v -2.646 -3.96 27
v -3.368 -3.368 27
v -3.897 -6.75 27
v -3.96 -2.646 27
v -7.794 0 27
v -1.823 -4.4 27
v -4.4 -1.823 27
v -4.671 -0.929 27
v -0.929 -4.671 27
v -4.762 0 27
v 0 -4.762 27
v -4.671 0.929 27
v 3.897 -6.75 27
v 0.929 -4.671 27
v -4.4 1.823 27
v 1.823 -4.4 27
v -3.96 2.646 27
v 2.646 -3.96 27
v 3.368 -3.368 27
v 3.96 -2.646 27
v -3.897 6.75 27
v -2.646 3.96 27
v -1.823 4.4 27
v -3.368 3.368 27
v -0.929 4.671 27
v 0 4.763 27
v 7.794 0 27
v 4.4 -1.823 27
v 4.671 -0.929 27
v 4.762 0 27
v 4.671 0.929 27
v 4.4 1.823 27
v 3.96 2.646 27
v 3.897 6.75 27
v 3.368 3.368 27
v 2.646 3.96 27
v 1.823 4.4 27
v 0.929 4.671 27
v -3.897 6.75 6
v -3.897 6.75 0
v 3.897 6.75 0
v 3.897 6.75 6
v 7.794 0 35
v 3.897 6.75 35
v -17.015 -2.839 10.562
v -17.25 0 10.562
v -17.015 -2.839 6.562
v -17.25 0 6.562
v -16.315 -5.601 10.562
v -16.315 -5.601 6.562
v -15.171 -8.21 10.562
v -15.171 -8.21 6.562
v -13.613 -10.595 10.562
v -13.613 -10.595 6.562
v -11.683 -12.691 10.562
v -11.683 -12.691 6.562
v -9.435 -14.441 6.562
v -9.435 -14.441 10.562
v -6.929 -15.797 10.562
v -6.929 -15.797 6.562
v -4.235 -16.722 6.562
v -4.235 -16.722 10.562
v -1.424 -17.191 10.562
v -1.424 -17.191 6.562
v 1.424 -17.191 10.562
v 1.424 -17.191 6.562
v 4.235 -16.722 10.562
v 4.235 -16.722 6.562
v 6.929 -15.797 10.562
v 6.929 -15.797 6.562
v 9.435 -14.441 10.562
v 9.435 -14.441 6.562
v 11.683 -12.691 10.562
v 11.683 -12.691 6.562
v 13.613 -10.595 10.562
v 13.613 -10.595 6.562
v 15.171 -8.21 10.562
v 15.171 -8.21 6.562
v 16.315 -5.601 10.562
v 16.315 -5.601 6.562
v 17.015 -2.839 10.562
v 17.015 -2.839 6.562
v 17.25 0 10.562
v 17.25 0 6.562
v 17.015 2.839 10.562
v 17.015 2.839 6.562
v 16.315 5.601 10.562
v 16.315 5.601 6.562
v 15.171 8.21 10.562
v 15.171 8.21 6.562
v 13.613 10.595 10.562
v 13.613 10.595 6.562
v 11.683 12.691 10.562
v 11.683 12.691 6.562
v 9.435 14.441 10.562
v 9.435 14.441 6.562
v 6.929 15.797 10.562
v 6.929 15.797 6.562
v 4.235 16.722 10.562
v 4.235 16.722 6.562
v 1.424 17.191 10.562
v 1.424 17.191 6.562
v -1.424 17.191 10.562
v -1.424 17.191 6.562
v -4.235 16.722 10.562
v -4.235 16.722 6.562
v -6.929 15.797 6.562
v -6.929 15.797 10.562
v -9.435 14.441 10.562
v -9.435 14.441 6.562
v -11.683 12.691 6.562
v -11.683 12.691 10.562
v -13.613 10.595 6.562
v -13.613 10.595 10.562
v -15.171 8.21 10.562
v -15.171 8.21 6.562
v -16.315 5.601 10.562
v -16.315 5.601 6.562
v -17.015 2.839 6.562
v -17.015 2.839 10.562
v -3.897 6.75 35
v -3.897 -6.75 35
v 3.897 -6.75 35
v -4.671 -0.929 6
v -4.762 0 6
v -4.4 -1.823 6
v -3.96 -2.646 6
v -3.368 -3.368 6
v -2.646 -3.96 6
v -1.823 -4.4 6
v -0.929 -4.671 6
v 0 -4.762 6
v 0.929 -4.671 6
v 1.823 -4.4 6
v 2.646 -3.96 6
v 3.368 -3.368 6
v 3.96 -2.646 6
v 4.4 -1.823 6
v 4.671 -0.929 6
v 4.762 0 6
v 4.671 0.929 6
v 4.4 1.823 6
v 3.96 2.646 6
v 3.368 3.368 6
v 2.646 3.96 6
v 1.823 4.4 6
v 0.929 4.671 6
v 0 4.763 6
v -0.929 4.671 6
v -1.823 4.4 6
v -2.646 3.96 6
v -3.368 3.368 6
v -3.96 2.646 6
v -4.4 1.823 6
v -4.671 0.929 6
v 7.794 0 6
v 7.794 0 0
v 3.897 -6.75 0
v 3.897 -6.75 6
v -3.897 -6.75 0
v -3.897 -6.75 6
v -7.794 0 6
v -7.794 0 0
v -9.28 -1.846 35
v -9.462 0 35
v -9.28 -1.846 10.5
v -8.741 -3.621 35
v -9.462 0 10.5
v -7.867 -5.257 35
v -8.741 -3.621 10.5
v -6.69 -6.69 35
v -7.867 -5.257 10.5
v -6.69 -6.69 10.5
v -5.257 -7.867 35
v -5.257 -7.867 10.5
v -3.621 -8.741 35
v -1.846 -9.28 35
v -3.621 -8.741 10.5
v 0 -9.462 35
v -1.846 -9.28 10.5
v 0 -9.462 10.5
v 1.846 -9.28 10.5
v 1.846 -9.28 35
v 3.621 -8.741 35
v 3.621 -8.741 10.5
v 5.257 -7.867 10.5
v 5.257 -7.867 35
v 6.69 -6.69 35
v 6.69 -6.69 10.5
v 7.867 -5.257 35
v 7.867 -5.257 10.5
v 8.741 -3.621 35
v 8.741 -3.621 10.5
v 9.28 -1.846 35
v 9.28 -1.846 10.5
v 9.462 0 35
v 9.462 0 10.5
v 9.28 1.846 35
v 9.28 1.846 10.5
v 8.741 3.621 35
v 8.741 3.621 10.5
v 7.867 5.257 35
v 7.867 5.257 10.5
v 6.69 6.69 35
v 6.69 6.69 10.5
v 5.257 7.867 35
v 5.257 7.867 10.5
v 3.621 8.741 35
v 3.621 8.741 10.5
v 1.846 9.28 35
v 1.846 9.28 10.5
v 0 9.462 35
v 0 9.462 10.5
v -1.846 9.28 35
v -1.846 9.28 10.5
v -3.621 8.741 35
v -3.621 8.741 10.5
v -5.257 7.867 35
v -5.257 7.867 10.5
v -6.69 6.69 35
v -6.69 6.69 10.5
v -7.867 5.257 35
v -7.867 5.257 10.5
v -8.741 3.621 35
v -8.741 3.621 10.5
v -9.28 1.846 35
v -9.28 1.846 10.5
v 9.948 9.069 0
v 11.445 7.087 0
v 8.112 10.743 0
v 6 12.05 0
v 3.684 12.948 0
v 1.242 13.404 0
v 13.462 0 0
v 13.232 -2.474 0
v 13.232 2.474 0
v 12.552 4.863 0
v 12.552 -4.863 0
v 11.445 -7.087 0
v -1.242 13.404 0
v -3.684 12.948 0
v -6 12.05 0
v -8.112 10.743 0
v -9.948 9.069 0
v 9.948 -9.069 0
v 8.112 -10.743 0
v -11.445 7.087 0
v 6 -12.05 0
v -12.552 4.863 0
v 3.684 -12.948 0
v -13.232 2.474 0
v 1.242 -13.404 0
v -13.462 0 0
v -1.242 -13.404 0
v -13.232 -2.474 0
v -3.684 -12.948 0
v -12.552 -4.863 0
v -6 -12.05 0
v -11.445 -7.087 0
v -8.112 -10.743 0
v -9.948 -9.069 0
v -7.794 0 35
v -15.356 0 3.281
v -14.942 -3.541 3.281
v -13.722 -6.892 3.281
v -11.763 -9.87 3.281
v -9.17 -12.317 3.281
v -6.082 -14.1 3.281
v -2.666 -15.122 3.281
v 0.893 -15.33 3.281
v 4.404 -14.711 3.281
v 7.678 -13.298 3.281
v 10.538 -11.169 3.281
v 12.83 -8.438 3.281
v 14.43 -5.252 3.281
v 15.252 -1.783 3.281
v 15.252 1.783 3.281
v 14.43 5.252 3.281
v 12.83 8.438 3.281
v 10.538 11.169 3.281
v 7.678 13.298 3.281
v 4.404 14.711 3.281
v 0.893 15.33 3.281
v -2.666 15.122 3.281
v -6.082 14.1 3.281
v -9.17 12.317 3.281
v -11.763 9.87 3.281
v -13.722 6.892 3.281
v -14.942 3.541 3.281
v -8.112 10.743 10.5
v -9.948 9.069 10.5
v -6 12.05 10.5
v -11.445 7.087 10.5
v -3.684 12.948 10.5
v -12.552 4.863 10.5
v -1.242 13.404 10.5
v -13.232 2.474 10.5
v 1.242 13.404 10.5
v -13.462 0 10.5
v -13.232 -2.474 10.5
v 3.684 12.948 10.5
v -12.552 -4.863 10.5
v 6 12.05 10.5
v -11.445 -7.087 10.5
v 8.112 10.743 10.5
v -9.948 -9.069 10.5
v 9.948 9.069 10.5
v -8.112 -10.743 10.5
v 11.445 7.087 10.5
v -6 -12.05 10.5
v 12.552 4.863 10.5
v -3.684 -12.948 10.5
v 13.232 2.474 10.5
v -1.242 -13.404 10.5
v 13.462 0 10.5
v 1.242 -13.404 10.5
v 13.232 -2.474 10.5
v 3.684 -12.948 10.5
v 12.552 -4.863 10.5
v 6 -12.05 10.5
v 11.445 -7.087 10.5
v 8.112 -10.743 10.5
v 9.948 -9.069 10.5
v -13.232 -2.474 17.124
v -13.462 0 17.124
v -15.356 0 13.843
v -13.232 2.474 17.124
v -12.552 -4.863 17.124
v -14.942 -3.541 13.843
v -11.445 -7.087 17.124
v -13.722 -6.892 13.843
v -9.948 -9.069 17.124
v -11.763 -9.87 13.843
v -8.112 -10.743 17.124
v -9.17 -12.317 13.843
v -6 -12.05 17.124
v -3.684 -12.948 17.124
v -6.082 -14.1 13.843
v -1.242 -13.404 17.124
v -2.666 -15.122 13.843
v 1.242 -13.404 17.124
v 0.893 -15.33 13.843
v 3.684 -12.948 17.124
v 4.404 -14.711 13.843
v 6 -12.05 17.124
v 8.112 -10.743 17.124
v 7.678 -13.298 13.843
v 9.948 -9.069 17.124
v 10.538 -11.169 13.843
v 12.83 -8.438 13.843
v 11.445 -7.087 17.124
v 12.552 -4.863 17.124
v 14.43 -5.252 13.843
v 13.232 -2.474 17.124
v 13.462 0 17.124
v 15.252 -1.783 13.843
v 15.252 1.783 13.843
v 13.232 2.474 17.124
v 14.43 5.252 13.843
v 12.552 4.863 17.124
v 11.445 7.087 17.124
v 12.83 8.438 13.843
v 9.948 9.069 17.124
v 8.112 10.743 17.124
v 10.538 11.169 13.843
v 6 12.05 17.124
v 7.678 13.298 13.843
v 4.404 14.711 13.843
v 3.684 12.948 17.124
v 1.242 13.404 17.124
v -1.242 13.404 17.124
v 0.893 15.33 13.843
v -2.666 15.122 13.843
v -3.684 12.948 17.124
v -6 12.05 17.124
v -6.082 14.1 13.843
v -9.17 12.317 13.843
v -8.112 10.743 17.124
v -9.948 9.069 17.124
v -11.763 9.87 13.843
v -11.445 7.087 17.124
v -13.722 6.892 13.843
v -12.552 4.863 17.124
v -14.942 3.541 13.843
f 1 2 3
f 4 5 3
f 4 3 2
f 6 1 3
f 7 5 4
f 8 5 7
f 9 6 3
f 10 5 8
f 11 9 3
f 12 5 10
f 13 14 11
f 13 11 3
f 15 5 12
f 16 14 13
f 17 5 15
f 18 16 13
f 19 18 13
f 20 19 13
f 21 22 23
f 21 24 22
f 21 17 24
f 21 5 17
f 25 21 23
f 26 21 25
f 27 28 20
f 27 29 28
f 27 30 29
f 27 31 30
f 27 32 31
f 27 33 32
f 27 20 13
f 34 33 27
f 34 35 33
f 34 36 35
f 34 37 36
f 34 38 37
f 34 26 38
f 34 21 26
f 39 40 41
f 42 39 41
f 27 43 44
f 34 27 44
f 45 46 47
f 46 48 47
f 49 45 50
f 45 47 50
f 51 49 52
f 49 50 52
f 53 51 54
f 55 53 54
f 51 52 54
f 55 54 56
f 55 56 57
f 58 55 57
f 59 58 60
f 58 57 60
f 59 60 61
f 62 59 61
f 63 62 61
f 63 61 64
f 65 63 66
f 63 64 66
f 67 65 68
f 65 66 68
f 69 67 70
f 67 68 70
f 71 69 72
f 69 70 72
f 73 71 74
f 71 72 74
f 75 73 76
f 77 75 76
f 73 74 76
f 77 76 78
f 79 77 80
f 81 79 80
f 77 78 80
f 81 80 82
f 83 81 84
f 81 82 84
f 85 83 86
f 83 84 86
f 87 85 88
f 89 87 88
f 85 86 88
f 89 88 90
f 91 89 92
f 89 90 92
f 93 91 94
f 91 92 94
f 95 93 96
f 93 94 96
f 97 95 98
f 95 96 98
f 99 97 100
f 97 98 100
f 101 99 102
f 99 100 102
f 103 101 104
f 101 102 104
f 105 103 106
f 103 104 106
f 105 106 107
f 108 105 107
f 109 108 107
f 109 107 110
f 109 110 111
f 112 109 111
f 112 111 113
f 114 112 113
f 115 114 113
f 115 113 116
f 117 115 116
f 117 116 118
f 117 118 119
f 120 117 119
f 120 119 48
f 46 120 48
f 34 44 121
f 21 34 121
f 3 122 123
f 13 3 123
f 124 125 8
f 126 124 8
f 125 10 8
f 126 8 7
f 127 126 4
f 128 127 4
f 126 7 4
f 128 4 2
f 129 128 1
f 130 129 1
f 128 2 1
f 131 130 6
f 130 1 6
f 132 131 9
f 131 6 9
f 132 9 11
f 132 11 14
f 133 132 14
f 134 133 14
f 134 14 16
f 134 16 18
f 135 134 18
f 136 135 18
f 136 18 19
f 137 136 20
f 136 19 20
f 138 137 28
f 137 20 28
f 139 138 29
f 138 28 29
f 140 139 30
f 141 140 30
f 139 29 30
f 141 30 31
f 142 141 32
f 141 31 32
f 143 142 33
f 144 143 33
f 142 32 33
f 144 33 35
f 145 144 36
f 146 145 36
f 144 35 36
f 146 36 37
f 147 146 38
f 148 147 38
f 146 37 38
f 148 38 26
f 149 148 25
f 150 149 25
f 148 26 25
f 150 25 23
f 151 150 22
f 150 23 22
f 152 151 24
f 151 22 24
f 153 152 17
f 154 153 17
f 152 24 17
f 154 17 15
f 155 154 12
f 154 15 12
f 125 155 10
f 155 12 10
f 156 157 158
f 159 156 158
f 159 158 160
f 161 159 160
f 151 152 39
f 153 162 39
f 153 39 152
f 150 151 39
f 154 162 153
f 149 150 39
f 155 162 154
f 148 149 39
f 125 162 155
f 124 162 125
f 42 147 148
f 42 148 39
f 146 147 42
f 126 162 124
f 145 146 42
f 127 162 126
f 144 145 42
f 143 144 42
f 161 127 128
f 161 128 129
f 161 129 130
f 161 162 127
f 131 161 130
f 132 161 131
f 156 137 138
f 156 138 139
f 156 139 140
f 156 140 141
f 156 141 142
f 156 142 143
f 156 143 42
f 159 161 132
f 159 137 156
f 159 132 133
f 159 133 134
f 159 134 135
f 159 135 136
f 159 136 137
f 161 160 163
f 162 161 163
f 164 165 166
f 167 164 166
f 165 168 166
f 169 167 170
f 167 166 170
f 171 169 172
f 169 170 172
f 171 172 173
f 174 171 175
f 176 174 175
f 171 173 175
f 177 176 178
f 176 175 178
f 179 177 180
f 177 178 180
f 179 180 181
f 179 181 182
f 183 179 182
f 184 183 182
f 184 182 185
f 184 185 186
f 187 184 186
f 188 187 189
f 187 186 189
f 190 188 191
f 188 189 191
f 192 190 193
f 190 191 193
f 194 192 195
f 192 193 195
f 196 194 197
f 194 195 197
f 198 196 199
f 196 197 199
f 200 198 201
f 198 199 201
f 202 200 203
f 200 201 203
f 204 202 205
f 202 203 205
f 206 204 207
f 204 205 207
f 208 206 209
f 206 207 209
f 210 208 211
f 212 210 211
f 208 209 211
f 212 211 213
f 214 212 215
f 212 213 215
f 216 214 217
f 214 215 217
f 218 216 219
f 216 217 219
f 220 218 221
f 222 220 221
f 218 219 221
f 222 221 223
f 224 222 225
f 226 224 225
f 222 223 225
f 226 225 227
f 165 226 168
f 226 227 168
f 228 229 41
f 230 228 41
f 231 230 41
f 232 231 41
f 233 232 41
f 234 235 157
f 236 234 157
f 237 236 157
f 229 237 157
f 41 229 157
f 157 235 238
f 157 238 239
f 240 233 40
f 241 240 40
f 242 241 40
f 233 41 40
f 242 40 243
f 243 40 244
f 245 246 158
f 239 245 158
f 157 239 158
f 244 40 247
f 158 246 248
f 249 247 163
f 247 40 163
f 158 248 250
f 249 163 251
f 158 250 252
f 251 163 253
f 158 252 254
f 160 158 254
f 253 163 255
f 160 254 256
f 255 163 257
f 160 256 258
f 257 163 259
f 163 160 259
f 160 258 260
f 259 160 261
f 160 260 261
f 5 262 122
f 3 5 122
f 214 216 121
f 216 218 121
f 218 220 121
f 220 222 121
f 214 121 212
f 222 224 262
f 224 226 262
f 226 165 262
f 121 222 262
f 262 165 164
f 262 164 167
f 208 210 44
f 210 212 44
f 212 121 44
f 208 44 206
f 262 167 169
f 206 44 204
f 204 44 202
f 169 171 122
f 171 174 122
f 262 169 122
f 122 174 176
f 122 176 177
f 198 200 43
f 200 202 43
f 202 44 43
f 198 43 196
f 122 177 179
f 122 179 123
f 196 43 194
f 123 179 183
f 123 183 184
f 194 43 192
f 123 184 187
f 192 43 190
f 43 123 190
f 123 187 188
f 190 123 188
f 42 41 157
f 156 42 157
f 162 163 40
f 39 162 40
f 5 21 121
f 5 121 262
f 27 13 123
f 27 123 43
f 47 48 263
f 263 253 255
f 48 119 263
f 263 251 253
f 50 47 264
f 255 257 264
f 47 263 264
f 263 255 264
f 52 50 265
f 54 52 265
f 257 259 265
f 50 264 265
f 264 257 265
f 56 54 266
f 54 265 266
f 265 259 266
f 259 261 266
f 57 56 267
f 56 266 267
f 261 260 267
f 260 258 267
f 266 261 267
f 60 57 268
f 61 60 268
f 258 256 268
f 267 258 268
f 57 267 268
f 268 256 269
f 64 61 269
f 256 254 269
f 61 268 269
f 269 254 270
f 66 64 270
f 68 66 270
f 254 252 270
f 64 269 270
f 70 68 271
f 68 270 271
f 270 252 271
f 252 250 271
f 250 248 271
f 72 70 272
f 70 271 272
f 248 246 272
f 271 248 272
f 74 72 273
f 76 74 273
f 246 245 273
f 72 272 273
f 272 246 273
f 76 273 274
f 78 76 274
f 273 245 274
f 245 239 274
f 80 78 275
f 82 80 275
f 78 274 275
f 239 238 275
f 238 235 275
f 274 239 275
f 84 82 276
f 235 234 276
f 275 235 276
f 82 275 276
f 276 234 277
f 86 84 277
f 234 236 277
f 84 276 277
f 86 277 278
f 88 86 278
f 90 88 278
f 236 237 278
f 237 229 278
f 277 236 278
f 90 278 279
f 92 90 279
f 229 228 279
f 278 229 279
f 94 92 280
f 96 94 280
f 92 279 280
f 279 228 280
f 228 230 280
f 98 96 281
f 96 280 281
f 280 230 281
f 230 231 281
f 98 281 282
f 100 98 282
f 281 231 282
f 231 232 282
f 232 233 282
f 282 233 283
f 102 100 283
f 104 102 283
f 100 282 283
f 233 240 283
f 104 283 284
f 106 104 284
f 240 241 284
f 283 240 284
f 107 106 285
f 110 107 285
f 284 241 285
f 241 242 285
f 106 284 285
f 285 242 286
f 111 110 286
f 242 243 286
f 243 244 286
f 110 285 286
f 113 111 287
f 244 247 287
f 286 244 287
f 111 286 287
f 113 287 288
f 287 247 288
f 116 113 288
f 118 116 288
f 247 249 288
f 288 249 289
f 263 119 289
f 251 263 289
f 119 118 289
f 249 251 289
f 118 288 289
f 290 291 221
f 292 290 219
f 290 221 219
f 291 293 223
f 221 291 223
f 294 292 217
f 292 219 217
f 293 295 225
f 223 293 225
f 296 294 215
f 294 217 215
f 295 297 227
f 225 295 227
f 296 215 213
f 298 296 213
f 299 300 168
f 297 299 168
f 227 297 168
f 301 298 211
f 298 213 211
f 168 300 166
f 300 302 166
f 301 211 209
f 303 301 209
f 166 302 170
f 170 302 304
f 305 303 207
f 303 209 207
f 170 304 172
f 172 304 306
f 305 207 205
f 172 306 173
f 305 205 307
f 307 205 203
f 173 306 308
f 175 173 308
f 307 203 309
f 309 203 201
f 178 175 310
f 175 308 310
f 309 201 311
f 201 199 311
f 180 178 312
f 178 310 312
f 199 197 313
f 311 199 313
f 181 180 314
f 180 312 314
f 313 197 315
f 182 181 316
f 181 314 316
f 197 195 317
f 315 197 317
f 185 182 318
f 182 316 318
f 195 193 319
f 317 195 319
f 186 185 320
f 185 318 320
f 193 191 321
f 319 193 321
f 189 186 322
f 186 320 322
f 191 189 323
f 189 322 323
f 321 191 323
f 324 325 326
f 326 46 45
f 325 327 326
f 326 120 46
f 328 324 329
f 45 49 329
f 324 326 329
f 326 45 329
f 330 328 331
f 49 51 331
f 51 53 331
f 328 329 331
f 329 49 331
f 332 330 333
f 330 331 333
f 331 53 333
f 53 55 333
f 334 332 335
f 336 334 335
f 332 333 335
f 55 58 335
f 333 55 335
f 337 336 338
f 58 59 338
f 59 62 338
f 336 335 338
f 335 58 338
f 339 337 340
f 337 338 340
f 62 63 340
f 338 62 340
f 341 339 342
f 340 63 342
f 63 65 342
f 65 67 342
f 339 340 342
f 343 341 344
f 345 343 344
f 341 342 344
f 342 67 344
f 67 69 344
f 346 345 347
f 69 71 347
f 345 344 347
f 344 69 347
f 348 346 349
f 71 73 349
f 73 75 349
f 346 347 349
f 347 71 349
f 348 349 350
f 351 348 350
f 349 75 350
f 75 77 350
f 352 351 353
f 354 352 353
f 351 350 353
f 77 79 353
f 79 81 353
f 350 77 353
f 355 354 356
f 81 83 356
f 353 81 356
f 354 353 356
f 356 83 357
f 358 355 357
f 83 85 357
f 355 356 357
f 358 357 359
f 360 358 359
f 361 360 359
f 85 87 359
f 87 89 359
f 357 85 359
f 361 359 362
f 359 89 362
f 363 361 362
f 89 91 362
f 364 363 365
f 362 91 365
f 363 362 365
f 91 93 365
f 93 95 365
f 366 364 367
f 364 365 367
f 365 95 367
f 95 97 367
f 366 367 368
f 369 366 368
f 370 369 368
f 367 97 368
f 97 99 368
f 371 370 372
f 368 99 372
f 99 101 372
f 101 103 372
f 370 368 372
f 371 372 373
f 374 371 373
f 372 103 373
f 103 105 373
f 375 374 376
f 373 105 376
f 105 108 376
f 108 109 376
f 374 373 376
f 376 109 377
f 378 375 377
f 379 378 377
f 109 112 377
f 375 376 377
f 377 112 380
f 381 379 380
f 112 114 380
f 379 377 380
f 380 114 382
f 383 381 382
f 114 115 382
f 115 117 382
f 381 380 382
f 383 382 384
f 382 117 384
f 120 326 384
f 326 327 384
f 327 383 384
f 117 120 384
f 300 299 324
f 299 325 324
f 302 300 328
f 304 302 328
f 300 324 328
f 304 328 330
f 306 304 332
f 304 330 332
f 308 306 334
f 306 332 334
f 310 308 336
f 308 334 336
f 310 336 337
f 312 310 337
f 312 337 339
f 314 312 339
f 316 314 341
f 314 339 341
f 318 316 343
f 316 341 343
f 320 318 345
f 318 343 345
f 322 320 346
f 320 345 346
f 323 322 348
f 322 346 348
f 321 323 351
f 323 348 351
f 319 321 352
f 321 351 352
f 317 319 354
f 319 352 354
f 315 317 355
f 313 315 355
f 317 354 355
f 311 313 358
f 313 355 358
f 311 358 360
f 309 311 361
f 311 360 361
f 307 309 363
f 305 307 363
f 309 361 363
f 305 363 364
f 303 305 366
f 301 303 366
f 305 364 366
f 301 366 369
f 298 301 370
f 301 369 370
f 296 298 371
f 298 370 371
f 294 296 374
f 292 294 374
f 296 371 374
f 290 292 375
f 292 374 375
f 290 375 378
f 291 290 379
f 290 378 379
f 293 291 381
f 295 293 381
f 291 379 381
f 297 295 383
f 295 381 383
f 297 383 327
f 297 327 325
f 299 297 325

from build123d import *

# Parameters (mm, degrees)
F2_R     = 4.7625
F3_DEPTH = 8
F4_R     = 4.7625
F5_DEPTH = 6


with BuildPart() as f1:
    # F0 (on Front) → F1 (revolve)
    with BuildSketch(Plane.XZ):
        Polygon((-13.4615, 0), (-4.7625, 0), (-4.7625, 35), (-9.4615, 35), (-9.4615, 10.5), (-13.4615, 10.5), (-13.4615, 17.1237489689), (-17.25, 10.5618744845), (-17.25, 6.5618744845), align=None)
    revolve(axis=Axis((0, 0, 27.3268250281), (0, 0, 1)))

    # F2 (on face) → F3 (cut)
    with BuildSketch(Plane.XY.offset(35)):
        Polygon((3.897114317, 6.75), (-3.897114317, 6.75), (-7.7942286341, 0), (-3.897114317, -6.75), (3.897114317, -6.75), (7.7942286341, 0), align=None)
        Circle(F2_R, mode=Mode.SUBTRACT)
    extrude(amount=-F3_DEPTH, mode=Mode.SUBTRACT)

    # F4 (on face) → F5 (cut)
    with BuildSketch(Plane(origin=(0, 0, 0), x_dir=(1, 0, 0), z_dir=(0, 0, -1))):
        Polygon((3.897114317, 6.75), (-3.897114317, 6.75), (-7.7942286341, 0), (-3.897114317, -6.75), (3.897114317, -6.75), (7.7942286341, 0), align=None)
        Circle(F4_R, mode=Mode.SUBTRACT)
    extrude(amount=-F5_DEPTH, mode=Mode.SUBTRACT)


solid = f1.part
